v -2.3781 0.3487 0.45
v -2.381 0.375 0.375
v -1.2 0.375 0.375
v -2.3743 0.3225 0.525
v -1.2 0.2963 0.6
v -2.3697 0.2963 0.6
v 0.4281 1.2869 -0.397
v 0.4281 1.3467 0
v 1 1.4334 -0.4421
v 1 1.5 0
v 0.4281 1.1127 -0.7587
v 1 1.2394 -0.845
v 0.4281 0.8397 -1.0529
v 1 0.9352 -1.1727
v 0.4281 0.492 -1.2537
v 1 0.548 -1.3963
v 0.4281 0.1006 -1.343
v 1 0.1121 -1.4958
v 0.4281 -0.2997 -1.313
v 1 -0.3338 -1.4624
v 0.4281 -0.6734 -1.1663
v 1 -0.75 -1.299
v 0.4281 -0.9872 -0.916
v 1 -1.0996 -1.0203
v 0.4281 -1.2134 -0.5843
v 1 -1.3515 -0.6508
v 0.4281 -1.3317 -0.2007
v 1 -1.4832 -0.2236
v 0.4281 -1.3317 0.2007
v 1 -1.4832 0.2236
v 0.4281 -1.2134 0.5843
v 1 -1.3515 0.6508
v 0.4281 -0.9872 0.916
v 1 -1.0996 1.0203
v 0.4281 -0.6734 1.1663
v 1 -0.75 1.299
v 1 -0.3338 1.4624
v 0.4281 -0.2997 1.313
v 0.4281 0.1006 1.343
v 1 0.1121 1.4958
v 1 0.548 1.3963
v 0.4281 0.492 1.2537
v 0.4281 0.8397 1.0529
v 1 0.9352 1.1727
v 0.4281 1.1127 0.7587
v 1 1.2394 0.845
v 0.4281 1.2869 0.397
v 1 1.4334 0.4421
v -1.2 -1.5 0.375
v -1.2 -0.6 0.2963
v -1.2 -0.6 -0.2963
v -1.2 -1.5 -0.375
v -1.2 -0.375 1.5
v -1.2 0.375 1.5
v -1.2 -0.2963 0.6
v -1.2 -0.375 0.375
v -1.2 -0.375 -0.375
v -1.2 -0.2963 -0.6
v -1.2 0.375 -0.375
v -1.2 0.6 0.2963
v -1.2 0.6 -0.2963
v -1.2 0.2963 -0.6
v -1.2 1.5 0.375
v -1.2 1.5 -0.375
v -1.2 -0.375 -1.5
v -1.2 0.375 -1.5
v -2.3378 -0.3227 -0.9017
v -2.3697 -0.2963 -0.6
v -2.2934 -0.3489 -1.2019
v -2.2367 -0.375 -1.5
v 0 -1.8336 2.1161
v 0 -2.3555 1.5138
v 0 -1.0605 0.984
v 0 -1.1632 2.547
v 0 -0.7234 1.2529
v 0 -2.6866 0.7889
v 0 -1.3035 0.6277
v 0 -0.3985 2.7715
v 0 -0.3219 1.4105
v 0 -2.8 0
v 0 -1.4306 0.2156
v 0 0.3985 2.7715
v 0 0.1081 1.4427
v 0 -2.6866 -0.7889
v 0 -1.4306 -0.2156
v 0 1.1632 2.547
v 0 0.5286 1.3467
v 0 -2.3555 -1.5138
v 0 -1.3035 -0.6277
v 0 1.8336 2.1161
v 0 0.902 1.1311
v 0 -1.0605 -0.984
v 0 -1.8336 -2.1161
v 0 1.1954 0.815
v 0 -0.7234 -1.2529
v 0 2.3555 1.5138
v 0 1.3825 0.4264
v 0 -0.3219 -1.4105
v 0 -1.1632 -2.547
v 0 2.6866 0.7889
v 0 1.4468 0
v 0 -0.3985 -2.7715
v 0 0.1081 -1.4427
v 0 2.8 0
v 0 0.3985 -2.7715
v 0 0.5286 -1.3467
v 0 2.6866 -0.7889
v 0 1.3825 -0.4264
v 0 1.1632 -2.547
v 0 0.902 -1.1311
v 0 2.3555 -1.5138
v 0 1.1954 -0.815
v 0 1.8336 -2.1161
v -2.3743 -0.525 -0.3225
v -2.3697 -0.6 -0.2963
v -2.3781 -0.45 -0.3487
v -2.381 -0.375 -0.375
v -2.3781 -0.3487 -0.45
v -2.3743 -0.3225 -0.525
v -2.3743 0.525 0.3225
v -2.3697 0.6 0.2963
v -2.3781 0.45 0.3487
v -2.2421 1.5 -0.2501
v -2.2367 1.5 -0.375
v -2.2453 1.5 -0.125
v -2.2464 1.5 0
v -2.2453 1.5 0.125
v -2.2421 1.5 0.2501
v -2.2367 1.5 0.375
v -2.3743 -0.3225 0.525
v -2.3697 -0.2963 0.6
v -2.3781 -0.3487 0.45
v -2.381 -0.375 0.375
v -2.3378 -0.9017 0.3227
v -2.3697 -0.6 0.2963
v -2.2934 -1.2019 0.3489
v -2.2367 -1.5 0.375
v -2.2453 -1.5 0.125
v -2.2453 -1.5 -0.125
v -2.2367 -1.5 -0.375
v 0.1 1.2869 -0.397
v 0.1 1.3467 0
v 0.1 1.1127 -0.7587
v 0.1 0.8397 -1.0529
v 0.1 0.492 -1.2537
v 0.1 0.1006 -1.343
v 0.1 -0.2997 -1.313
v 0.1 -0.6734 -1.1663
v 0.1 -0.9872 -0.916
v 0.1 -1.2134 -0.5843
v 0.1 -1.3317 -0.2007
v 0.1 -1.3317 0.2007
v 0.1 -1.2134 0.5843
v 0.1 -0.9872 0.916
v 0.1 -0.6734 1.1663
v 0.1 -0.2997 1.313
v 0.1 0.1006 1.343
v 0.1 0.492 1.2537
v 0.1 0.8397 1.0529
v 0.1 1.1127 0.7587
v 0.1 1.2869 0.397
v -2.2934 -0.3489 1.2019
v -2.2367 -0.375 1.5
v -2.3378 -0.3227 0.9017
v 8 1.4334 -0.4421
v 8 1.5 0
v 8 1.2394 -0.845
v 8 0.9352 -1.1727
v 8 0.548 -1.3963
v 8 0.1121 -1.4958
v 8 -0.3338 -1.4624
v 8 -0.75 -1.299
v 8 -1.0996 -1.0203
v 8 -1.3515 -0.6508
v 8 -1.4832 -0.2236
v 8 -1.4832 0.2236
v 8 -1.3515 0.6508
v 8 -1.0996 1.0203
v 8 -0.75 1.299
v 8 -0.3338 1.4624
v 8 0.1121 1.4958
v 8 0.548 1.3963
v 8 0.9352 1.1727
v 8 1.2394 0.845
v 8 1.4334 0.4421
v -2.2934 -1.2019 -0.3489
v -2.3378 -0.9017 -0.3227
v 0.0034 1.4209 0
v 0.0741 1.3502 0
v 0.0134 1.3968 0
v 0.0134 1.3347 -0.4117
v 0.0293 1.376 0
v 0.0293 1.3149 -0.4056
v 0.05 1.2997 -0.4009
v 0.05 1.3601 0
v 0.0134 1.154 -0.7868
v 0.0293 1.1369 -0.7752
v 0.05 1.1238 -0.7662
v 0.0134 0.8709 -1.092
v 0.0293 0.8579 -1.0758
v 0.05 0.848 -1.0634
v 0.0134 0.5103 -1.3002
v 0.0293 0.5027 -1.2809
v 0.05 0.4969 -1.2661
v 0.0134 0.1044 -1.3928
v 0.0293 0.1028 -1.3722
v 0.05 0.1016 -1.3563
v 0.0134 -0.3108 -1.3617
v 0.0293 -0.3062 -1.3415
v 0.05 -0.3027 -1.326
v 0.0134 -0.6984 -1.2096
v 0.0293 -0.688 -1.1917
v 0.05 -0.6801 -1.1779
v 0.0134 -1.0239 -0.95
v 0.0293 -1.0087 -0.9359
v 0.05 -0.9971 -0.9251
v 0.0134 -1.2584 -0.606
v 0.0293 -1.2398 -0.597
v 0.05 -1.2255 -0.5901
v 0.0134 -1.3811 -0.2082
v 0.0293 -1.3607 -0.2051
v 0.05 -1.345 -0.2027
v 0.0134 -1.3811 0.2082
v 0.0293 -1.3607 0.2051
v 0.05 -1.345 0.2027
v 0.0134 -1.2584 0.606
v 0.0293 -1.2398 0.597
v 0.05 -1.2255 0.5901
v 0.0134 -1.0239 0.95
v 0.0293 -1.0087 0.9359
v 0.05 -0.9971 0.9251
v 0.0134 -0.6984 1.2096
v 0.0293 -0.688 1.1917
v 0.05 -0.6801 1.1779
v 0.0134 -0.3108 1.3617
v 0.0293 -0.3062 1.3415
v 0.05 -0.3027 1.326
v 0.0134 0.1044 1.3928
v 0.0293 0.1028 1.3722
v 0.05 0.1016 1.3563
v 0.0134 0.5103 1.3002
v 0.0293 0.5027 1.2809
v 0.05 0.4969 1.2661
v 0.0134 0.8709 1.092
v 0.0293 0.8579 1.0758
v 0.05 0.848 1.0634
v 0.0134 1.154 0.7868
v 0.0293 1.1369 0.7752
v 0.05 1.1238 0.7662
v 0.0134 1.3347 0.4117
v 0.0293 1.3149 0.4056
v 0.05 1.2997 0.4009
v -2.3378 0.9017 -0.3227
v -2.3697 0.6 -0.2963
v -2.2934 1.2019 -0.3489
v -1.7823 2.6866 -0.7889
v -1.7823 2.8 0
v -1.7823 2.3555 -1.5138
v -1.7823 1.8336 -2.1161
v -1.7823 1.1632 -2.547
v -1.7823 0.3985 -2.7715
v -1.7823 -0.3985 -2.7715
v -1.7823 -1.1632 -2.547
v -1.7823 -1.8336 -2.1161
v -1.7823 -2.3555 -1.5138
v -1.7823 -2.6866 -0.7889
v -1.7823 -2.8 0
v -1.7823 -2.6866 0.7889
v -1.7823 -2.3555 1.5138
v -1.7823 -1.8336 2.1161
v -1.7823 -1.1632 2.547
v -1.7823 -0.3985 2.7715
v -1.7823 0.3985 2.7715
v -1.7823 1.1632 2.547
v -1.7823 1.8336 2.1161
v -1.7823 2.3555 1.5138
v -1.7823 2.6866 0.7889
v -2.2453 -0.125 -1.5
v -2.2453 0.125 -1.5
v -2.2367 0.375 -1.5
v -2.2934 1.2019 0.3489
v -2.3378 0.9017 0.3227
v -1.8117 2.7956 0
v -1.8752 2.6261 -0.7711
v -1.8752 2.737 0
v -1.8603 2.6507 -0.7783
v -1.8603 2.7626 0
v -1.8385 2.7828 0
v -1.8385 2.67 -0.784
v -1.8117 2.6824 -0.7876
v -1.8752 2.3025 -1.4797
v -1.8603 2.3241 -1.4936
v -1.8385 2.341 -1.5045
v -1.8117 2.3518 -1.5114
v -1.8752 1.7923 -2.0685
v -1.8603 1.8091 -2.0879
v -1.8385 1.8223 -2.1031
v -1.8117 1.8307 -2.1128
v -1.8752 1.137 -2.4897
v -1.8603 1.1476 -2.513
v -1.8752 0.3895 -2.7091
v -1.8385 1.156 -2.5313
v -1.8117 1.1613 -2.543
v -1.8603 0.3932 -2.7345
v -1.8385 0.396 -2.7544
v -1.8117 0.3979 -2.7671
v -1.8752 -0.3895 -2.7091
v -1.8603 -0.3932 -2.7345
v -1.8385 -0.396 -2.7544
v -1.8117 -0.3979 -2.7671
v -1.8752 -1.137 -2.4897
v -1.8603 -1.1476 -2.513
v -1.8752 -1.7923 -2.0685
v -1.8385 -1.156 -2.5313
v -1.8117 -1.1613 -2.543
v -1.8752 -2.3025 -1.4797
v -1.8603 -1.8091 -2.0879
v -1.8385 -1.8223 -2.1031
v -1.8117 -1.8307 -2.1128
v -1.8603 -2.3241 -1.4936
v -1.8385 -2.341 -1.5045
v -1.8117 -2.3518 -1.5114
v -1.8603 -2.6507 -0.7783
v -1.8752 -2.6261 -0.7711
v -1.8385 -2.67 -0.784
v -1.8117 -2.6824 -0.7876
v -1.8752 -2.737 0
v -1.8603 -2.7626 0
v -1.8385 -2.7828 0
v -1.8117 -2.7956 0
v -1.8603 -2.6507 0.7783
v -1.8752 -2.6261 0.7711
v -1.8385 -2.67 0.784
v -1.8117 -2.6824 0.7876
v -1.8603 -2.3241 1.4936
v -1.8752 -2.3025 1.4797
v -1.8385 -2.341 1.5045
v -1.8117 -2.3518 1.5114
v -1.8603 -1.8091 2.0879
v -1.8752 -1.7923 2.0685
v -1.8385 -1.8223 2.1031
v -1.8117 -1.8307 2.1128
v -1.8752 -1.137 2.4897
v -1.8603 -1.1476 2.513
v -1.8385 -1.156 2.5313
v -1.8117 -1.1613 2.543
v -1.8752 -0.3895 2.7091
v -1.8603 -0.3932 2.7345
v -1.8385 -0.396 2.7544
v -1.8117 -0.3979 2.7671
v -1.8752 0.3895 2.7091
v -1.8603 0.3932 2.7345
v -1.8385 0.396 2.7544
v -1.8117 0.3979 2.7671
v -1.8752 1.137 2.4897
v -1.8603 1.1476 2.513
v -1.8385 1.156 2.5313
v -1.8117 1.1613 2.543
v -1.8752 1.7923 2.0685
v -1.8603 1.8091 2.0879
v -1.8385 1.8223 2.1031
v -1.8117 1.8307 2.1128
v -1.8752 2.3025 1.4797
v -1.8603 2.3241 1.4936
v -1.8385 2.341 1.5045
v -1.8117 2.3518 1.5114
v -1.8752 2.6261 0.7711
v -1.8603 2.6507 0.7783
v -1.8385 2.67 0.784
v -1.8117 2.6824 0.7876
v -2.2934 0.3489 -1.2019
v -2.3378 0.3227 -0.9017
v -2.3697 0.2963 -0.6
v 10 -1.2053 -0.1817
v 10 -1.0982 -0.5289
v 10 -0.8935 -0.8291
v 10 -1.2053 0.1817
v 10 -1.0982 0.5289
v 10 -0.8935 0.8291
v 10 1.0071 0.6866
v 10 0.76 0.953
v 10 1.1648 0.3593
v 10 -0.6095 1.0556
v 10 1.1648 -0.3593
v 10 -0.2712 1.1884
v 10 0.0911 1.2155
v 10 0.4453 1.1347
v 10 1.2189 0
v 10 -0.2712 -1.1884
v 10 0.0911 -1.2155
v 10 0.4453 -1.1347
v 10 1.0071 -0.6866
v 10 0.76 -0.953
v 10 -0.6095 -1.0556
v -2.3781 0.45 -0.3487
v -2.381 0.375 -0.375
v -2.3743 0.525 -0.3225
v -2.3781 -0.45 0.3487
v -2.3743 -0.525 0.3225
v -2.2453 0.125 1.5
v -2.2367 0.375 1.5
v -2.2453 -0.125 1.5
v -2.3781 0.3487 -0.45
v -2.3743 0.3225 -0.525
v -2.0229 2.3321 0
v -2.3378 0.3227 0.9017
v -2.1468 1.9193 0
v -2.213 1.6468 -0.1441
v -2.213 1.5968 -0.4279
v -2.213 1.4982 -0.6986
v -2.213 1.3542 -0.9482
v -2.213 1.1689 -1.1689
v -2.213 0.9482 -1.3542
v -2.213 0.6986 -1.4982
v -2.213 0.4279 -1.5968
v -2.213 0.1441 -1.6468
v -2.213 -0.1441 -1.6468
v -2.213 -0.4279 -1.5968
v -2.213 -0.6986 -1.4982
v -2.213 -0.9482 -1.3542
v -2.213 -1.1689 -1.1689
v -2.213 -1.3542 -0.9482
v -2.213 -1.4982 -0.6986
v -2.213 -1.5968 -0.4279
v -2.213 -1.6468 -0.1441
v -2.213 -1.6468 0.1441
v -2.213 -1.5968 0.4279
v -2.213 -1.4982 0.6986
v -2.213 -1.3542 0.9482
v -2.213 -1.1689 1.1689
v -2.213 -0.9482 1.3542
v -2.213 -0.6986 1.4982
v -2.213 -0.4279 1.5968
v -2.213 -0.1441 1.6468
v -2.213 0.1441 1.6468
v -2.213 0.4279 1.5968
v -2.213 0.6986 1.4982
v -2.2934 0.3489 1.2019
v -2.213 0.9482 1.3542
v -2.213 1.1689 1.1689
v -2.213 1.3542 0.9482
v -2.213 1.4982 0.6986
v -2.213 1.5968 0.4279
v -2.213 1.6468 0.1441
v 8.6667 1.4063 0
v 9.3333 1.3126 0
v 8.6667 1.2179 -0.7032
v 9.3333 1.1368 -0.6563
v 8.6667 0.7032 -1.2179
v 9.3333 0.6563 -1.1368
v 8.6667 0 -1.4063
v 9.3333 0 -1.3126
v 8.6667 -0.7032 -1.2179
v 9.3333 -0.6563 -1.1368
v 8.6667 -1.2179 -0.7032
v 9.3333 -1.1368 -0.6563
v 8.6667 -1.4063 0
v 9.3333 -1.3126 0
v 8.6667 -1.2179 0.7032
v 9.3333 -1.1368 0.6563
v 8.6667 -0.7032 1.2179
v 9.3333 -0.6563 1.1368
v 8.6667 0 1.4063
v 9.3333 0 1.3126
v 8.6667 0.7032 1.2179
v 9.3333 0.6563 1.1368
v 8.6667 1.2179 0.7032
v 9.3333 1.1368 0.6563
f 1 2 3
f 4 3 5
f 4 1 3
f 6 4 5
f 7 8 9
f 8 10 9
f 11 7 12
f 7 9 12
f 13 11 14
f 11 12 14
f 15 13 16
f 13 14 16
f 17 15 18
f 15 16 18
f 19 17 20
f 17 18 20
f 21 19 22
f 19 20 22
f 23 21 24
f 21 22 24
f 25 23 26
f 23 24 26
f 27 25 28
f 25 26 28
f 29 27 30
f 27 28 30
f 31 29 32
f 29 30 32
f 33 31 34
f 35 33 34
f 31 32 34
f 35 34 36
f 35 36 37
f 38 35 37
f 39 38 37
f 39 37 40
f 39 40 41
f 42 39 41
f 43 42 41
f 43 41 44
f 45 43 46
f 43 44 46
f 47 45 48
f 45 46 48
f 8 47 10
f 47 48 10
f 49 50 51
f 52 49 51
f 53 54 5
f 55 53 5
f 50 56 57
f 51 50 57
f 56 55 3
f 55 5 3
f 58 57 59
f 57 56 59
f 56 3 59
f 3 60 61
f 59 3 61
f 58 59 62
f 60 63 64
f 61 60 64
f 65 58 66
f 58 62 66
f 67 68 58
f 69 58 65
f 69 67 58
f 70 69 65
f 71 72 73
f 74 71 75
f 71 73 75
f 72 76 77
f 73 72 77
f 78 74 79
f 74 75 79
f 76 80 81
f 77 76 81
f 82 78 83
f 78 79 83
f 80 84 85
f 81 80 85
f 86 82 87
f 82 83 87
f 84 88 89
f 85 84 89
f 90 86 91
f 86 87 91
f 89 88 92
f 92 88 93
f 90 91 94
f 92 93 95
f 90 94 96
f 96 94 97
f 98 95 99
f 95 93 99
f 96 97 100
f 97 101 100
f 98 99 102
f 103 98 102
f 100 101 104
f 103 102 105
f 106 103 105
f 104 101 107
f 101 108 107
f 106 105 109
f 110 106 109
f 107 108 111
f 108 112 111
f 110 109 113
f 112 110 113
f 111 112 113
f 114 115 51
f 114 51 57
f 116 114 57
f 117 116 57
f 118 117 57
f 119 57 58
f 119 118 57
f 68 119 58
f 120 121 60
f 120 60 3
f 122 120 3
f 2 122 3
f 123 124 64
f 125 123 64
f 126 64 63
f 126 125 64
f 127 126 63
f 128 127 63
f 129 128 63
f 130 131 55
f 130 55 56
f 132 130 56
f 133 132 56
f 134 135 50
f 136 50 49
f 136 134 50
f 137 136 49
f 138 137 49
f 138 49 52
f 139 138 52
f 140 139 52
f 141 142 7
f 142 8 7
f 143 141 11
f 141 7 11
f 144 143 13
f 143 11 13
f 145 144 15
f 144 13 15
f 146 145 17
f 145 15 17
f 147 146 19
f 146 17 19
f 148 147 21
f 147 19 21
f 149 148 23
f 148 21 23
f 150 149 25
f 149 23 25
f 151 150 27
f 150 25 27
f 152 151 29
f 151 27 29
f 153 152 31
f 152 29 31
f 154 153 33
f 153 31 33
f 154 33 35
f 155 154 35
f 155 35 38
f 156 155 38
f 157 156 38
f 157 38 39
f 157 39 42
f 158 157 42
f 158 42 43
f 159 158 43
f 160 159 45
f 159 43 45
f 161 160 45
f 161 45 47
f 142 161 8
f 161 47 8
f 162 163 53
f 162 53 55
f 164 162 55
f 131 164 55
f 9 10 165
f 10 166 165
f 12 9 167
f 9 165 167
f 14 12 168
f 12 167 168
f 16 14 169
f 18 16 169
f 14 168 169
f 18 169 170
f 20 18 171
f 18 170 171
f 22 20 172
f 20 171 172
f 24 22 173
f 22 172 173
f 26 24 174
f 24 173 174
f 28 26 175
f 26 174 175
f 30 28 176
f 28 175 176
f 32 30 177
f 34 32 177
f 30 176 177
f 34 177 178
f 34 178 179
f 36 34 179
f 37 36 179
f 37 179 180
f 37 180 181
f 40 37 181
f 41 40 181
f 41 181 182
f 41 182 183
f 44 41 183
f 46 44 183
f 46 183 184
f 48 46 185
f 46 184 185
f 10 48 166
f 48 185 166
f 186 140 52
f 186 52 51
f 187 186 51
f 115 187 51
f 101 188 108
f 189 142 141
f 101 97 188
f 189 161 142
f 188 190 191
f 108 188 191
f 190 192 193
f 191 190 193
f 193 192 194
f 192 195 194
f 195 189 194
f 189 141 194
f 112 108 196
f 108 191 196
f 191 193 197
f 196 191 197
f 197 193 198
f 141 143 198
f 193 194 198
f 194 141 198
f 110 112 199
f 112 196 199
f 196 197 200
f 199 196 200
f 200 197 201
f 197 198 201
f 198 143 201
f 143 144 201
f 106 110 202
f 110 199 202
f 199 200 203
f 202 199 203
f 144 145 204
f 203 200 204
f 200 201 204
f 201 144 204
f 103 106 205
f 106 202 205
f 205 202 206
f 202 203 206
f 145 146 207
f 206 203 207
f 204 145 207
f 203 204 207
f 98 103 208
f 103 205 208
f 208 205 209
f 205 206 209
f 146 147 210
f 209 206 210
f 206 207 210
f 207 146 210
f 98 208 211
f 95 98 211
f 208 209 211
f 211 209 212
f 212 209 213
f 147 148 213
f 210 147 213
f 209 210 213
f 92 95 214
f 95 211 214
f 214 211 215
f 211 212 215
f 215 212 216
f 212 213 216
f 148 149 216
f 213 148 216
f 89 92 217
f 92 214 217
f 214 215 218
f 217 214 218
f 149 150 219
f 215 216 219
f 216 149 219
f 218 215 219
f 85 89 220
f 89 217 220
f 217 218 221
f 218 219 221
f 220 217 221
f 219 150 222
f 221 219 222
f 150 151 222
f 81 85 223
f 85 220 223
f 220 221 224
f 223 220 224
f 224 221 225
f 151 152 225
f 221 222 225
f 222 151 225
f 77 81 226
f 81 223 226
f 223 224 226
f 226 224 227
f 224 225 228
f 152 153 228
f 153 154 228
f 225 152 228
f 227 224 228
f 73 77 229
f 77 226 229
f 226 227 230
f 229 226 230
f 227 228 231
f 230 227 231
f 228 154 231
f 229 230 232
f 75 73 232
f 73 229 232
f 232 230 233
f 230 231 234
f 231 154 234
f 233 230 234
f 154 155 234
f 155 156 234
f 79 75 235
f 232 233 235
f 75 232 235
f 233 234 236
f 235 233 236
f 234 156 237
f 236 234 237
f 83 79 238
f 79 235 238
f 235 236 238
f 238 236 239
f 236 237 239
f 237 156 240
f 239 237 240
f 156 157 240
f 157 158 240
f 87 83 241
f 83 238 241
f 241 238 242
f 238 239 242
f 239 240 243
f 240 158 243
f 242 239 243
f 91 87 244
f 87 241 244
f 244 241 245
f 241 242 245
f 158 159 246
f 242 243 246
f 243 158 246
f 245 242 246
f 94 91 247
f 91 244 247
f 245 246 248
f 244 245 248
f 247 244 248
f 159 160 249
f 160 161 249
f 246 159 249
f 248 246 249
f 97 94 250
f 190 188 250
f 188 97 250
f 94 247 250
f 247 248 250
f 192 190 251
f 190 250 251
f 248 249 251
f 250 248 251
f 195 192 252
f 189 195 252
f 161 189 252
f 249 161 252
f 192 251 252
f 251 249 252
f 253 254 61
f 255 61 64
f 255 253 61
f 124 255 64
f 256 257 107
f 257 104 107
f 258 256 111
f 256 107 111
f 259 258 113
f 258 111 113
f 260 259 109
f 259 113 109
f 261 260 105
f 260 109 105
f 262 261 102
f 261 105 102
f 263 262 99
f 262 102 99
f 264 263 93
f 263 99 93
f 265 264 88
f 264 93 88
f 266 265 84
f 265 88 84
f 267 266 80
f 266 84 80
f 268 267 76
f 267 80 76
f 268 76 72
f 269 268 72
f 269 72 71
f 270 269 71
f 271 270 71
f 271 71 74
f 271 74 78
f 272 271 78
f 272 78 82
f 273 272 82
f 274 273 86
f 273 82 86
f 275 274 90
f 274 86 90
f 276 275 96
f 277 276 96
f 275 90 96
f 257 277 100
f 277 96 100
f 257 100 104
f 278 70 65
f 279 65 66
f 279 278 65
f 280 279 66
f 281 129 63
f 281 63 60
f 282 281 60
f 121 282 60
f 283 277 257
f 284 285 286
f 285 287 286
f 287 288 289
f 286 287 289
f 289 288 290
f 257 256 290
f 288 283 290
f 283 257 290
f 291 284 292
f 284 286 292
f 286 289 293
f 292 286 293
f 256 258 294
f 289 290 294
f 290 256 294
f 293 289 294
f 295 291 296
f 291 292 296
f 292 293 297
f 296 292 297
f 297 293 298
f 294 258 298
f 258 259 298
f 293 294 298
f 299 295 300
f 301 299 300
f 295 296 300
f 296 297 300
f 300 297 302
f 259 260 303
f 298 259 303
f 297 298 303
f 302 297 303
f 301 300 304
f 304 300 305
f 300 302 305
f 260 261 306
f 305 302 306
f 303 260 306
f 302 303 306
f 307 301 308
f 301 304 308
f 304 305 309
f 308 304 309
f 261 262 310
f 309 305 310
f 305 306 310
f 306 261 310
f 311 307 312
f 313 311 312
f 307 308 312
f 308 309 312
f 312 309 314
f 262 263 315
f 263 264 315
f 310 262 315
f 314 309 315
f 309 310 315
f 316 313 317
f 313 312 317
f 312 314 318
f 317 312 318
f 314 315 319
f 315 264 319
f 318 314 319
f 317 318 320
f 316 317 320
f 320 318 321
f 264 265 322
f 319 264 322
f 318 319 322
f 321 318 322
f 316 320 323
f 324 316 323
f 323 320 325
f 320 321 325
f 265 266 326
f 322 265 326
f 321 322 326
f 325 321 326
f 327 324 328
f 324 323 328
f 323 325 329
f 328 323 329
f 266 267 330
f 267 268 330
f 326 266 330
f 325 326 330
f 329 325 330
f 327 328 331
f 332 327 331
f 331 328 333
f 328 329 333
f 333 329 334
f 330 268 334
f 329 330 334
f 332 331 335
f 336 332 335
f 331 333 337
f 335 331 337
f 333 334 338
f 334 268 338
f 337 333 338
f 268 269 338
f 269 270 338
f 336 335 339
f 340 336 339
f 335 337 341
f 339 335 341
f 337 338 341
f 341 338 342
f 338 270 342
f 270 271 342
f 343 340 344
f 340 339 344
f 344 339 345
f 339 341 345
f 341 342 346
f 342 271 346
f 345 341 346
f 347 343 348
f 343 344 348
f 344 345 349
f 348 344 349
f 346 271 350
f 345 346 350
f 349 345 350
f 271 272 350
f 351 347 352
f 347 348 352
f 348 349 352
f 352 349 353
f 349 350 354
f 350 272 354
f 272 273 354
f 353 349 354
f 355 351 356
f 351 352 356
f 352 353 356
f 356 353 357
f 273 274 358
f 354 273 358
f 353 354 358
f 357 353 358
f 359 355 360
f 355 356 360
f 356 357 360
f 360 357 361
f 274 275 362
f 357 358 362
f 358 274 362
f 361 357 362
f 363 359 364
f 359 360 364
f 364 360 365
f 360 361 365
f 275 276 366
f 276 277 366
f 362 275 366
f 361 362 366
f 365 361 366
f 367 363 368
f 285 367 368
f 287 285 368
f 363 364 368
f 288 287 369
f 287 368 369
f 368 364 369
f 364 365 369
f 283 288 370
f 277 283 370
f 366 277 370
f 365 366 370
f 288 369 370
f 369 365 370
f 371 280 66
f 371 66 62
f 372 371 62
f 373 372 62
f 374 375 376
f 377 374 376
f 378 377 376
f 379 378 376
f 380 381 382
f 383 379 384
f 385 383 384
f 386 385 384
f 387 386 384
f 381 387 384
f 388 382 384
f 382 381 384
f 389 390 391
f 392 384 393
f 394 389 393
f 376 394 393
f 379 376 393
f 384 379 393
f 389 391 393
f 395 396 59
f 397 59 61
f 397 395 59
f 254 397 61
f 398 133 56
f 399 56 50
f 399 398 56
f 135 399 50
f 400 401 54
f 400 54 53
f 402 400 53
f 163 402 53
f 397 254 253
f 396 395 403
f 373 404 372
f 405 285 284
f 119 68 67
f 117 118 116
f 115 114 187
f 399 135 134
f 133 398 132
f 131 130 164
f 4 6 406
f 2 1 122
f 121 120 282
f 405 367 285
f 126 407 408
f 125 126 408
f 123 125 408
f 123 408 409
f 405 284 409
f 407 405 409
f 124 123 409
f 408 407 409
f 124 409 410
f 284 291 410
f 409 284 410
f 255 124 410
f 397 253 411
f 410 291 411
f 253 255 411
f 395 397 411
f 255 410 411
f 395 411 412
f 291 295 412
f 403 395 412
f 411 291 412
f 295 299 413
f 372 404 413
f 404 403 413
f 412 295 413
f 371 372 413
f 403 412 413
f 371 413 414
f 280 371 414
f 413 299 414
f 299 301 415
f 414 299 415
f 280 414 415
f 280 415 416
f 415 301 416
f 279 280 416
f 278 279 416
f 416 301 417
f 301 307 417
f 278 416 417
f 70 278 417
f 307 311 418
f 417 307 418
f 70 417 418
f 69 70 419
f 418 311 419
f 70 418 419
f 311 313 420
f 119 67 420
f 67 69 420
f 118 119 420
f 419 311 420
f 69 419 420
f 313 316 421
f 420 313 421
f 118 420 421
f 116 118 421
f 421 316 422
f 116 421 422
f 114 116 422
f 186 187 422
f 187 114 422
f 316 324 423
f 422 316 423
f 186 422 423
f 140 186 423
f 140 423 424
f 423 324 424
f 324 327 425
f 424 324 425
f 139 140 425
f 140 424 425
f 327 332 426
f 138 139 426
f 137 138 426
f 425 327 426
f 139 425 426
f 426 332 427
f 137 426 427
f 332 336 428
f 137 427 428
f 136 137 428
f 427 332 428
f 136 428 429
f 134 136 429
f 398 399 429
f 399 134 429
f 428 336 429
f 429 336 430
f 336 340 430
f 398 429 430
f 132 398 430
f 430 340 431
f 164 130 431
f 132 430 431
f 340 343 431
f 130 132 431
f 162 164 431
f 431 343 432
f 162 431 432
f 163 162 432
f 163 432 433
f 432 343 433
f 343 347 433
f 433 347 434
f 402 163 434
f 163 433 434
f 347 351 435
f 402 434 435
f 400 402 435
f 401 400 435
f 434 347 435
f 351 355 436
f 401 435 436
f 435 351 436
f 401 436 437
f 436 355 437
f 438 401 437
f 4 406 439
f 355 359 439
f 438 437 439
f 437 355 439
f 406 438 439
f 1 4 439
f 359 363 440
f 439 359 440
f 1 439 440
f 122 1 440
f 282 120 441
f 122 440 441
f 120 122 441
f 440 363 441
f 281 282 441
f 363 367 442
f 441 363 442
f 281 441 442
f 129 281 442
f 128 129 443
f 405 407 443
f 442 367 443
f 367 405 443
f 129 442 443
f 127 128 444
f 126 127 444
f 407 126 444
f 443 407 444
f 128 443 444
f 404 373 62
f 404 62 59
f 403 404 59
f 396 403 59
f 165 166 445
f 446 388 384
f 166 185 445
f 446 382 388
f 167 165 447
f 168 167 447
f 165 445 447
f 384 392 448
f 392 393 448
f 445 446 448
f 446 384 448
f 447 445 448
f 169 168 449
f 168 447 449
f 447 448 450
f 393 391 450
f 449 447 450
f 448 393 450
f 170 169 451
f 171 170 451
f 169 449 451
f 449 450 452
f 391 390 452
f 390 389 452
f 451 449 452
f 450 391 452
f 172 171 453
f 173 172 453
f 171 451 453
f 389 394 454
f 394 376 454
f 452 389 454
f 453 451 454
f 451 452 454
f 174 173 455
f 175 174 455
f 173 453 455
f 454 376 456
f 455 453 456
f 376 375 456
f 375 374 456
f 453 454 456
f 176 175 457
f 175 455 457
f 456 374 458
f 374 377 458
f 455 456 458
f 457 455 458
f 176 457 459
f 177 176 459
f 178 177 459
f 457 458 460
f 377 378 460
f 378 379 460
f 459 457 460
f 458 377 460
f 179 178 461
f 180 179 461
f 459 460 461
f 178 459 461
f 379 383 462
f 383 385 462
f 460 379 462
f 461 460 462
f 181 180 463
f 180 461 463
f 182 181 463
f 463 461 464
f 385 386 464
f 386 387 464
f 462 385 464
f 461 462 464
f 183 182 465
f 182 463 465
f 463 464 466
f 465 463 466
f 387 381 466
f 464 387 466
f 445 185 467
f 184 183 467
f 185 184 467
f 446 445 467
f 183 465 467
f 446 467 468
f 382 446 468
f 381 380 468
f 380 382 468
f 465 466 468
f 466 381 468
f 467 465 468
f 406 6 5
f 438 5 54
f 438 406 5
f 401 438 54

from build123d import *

# Parameters (mm, degrees)
CUT_EXTRUDE1_DEPTH      = 1.2
CUT_EXTRUDE1_DEPTH_BACK = 1.2


with BuildPart() as part:
    # Sketch1 → Revolve1 (revolve)
    with BuildSketch(Plane.XY):
        with BuildLine():
            Line((-1.782329983, 2.8), (0, 2.8))
            Line((0, 2.8), (0, 1.44675))
            ThreePointArc((0, 1.44675), (0.029289322, 1.376039322), (0.1, 1.34675))
            Line((0.1, 1.34675), (0.428063214, 1.34675))
            Line((0.428063214, 1.34675), (1, 1.5))
            Line((1, 1.5), (8, 1.5))
            Line((8, 1.5), (10, 1.218918331))
            Line((10, 1.218918331), (10, 0))
            Line((10, 0), (-2.4, 0))
            ThreePointArc((-2.4, 0), (-2.267625669, 1.393419223), (-1.875238613, 2.736986301))
            ThreePointArc((-1.875238613, 2.736986301), (-1.838460945, 2.782760589), (-1.782329983, 2.8))
        make_face()
    revolve(axis=Axis((13, 0, 0), (-1, 0, 0)))

    # Sketch2 → Cut-Extrude1 (cut, two sides)
    with BuildSketch(Plane(origin=(-2.4, 0, 0), x_dir=(0, 0, -1), z_dir=(1, 0, 0))) as cut_extrude1_sk:
        Polygon((-1.5, 0.375), (-1.5, -0.375), (-0.6, -0.296260203), (-0.375, -0.375), (-0.296260203, -0.6), (-0.375, -1.5), (0.375, -1.5), (0.296260203, -0.6), (0.375, -0.375), (0.6, -0.296260203), (1.5, -0.375), (1.5, 0.375), (0.6, 0.296260203), (0.375, 0.375), (0.296260203, 0.6), (0.375, 1.5), (-0.375, 1.5), (-0.296260203, 0.6), (-0.375, 0.375), (-0.6, 0.296260203), align=None)
    extrude(amount=CUT_EXTRUDE1_DEPTH, mode=Mode.SUBTRACT)
    extrude(cut_extrude1_sk.sketch, amount=-CUT_EXTRUDE1_DEPTH_BACK, mode=Mode.SUBTRACT)


solid = part.part
